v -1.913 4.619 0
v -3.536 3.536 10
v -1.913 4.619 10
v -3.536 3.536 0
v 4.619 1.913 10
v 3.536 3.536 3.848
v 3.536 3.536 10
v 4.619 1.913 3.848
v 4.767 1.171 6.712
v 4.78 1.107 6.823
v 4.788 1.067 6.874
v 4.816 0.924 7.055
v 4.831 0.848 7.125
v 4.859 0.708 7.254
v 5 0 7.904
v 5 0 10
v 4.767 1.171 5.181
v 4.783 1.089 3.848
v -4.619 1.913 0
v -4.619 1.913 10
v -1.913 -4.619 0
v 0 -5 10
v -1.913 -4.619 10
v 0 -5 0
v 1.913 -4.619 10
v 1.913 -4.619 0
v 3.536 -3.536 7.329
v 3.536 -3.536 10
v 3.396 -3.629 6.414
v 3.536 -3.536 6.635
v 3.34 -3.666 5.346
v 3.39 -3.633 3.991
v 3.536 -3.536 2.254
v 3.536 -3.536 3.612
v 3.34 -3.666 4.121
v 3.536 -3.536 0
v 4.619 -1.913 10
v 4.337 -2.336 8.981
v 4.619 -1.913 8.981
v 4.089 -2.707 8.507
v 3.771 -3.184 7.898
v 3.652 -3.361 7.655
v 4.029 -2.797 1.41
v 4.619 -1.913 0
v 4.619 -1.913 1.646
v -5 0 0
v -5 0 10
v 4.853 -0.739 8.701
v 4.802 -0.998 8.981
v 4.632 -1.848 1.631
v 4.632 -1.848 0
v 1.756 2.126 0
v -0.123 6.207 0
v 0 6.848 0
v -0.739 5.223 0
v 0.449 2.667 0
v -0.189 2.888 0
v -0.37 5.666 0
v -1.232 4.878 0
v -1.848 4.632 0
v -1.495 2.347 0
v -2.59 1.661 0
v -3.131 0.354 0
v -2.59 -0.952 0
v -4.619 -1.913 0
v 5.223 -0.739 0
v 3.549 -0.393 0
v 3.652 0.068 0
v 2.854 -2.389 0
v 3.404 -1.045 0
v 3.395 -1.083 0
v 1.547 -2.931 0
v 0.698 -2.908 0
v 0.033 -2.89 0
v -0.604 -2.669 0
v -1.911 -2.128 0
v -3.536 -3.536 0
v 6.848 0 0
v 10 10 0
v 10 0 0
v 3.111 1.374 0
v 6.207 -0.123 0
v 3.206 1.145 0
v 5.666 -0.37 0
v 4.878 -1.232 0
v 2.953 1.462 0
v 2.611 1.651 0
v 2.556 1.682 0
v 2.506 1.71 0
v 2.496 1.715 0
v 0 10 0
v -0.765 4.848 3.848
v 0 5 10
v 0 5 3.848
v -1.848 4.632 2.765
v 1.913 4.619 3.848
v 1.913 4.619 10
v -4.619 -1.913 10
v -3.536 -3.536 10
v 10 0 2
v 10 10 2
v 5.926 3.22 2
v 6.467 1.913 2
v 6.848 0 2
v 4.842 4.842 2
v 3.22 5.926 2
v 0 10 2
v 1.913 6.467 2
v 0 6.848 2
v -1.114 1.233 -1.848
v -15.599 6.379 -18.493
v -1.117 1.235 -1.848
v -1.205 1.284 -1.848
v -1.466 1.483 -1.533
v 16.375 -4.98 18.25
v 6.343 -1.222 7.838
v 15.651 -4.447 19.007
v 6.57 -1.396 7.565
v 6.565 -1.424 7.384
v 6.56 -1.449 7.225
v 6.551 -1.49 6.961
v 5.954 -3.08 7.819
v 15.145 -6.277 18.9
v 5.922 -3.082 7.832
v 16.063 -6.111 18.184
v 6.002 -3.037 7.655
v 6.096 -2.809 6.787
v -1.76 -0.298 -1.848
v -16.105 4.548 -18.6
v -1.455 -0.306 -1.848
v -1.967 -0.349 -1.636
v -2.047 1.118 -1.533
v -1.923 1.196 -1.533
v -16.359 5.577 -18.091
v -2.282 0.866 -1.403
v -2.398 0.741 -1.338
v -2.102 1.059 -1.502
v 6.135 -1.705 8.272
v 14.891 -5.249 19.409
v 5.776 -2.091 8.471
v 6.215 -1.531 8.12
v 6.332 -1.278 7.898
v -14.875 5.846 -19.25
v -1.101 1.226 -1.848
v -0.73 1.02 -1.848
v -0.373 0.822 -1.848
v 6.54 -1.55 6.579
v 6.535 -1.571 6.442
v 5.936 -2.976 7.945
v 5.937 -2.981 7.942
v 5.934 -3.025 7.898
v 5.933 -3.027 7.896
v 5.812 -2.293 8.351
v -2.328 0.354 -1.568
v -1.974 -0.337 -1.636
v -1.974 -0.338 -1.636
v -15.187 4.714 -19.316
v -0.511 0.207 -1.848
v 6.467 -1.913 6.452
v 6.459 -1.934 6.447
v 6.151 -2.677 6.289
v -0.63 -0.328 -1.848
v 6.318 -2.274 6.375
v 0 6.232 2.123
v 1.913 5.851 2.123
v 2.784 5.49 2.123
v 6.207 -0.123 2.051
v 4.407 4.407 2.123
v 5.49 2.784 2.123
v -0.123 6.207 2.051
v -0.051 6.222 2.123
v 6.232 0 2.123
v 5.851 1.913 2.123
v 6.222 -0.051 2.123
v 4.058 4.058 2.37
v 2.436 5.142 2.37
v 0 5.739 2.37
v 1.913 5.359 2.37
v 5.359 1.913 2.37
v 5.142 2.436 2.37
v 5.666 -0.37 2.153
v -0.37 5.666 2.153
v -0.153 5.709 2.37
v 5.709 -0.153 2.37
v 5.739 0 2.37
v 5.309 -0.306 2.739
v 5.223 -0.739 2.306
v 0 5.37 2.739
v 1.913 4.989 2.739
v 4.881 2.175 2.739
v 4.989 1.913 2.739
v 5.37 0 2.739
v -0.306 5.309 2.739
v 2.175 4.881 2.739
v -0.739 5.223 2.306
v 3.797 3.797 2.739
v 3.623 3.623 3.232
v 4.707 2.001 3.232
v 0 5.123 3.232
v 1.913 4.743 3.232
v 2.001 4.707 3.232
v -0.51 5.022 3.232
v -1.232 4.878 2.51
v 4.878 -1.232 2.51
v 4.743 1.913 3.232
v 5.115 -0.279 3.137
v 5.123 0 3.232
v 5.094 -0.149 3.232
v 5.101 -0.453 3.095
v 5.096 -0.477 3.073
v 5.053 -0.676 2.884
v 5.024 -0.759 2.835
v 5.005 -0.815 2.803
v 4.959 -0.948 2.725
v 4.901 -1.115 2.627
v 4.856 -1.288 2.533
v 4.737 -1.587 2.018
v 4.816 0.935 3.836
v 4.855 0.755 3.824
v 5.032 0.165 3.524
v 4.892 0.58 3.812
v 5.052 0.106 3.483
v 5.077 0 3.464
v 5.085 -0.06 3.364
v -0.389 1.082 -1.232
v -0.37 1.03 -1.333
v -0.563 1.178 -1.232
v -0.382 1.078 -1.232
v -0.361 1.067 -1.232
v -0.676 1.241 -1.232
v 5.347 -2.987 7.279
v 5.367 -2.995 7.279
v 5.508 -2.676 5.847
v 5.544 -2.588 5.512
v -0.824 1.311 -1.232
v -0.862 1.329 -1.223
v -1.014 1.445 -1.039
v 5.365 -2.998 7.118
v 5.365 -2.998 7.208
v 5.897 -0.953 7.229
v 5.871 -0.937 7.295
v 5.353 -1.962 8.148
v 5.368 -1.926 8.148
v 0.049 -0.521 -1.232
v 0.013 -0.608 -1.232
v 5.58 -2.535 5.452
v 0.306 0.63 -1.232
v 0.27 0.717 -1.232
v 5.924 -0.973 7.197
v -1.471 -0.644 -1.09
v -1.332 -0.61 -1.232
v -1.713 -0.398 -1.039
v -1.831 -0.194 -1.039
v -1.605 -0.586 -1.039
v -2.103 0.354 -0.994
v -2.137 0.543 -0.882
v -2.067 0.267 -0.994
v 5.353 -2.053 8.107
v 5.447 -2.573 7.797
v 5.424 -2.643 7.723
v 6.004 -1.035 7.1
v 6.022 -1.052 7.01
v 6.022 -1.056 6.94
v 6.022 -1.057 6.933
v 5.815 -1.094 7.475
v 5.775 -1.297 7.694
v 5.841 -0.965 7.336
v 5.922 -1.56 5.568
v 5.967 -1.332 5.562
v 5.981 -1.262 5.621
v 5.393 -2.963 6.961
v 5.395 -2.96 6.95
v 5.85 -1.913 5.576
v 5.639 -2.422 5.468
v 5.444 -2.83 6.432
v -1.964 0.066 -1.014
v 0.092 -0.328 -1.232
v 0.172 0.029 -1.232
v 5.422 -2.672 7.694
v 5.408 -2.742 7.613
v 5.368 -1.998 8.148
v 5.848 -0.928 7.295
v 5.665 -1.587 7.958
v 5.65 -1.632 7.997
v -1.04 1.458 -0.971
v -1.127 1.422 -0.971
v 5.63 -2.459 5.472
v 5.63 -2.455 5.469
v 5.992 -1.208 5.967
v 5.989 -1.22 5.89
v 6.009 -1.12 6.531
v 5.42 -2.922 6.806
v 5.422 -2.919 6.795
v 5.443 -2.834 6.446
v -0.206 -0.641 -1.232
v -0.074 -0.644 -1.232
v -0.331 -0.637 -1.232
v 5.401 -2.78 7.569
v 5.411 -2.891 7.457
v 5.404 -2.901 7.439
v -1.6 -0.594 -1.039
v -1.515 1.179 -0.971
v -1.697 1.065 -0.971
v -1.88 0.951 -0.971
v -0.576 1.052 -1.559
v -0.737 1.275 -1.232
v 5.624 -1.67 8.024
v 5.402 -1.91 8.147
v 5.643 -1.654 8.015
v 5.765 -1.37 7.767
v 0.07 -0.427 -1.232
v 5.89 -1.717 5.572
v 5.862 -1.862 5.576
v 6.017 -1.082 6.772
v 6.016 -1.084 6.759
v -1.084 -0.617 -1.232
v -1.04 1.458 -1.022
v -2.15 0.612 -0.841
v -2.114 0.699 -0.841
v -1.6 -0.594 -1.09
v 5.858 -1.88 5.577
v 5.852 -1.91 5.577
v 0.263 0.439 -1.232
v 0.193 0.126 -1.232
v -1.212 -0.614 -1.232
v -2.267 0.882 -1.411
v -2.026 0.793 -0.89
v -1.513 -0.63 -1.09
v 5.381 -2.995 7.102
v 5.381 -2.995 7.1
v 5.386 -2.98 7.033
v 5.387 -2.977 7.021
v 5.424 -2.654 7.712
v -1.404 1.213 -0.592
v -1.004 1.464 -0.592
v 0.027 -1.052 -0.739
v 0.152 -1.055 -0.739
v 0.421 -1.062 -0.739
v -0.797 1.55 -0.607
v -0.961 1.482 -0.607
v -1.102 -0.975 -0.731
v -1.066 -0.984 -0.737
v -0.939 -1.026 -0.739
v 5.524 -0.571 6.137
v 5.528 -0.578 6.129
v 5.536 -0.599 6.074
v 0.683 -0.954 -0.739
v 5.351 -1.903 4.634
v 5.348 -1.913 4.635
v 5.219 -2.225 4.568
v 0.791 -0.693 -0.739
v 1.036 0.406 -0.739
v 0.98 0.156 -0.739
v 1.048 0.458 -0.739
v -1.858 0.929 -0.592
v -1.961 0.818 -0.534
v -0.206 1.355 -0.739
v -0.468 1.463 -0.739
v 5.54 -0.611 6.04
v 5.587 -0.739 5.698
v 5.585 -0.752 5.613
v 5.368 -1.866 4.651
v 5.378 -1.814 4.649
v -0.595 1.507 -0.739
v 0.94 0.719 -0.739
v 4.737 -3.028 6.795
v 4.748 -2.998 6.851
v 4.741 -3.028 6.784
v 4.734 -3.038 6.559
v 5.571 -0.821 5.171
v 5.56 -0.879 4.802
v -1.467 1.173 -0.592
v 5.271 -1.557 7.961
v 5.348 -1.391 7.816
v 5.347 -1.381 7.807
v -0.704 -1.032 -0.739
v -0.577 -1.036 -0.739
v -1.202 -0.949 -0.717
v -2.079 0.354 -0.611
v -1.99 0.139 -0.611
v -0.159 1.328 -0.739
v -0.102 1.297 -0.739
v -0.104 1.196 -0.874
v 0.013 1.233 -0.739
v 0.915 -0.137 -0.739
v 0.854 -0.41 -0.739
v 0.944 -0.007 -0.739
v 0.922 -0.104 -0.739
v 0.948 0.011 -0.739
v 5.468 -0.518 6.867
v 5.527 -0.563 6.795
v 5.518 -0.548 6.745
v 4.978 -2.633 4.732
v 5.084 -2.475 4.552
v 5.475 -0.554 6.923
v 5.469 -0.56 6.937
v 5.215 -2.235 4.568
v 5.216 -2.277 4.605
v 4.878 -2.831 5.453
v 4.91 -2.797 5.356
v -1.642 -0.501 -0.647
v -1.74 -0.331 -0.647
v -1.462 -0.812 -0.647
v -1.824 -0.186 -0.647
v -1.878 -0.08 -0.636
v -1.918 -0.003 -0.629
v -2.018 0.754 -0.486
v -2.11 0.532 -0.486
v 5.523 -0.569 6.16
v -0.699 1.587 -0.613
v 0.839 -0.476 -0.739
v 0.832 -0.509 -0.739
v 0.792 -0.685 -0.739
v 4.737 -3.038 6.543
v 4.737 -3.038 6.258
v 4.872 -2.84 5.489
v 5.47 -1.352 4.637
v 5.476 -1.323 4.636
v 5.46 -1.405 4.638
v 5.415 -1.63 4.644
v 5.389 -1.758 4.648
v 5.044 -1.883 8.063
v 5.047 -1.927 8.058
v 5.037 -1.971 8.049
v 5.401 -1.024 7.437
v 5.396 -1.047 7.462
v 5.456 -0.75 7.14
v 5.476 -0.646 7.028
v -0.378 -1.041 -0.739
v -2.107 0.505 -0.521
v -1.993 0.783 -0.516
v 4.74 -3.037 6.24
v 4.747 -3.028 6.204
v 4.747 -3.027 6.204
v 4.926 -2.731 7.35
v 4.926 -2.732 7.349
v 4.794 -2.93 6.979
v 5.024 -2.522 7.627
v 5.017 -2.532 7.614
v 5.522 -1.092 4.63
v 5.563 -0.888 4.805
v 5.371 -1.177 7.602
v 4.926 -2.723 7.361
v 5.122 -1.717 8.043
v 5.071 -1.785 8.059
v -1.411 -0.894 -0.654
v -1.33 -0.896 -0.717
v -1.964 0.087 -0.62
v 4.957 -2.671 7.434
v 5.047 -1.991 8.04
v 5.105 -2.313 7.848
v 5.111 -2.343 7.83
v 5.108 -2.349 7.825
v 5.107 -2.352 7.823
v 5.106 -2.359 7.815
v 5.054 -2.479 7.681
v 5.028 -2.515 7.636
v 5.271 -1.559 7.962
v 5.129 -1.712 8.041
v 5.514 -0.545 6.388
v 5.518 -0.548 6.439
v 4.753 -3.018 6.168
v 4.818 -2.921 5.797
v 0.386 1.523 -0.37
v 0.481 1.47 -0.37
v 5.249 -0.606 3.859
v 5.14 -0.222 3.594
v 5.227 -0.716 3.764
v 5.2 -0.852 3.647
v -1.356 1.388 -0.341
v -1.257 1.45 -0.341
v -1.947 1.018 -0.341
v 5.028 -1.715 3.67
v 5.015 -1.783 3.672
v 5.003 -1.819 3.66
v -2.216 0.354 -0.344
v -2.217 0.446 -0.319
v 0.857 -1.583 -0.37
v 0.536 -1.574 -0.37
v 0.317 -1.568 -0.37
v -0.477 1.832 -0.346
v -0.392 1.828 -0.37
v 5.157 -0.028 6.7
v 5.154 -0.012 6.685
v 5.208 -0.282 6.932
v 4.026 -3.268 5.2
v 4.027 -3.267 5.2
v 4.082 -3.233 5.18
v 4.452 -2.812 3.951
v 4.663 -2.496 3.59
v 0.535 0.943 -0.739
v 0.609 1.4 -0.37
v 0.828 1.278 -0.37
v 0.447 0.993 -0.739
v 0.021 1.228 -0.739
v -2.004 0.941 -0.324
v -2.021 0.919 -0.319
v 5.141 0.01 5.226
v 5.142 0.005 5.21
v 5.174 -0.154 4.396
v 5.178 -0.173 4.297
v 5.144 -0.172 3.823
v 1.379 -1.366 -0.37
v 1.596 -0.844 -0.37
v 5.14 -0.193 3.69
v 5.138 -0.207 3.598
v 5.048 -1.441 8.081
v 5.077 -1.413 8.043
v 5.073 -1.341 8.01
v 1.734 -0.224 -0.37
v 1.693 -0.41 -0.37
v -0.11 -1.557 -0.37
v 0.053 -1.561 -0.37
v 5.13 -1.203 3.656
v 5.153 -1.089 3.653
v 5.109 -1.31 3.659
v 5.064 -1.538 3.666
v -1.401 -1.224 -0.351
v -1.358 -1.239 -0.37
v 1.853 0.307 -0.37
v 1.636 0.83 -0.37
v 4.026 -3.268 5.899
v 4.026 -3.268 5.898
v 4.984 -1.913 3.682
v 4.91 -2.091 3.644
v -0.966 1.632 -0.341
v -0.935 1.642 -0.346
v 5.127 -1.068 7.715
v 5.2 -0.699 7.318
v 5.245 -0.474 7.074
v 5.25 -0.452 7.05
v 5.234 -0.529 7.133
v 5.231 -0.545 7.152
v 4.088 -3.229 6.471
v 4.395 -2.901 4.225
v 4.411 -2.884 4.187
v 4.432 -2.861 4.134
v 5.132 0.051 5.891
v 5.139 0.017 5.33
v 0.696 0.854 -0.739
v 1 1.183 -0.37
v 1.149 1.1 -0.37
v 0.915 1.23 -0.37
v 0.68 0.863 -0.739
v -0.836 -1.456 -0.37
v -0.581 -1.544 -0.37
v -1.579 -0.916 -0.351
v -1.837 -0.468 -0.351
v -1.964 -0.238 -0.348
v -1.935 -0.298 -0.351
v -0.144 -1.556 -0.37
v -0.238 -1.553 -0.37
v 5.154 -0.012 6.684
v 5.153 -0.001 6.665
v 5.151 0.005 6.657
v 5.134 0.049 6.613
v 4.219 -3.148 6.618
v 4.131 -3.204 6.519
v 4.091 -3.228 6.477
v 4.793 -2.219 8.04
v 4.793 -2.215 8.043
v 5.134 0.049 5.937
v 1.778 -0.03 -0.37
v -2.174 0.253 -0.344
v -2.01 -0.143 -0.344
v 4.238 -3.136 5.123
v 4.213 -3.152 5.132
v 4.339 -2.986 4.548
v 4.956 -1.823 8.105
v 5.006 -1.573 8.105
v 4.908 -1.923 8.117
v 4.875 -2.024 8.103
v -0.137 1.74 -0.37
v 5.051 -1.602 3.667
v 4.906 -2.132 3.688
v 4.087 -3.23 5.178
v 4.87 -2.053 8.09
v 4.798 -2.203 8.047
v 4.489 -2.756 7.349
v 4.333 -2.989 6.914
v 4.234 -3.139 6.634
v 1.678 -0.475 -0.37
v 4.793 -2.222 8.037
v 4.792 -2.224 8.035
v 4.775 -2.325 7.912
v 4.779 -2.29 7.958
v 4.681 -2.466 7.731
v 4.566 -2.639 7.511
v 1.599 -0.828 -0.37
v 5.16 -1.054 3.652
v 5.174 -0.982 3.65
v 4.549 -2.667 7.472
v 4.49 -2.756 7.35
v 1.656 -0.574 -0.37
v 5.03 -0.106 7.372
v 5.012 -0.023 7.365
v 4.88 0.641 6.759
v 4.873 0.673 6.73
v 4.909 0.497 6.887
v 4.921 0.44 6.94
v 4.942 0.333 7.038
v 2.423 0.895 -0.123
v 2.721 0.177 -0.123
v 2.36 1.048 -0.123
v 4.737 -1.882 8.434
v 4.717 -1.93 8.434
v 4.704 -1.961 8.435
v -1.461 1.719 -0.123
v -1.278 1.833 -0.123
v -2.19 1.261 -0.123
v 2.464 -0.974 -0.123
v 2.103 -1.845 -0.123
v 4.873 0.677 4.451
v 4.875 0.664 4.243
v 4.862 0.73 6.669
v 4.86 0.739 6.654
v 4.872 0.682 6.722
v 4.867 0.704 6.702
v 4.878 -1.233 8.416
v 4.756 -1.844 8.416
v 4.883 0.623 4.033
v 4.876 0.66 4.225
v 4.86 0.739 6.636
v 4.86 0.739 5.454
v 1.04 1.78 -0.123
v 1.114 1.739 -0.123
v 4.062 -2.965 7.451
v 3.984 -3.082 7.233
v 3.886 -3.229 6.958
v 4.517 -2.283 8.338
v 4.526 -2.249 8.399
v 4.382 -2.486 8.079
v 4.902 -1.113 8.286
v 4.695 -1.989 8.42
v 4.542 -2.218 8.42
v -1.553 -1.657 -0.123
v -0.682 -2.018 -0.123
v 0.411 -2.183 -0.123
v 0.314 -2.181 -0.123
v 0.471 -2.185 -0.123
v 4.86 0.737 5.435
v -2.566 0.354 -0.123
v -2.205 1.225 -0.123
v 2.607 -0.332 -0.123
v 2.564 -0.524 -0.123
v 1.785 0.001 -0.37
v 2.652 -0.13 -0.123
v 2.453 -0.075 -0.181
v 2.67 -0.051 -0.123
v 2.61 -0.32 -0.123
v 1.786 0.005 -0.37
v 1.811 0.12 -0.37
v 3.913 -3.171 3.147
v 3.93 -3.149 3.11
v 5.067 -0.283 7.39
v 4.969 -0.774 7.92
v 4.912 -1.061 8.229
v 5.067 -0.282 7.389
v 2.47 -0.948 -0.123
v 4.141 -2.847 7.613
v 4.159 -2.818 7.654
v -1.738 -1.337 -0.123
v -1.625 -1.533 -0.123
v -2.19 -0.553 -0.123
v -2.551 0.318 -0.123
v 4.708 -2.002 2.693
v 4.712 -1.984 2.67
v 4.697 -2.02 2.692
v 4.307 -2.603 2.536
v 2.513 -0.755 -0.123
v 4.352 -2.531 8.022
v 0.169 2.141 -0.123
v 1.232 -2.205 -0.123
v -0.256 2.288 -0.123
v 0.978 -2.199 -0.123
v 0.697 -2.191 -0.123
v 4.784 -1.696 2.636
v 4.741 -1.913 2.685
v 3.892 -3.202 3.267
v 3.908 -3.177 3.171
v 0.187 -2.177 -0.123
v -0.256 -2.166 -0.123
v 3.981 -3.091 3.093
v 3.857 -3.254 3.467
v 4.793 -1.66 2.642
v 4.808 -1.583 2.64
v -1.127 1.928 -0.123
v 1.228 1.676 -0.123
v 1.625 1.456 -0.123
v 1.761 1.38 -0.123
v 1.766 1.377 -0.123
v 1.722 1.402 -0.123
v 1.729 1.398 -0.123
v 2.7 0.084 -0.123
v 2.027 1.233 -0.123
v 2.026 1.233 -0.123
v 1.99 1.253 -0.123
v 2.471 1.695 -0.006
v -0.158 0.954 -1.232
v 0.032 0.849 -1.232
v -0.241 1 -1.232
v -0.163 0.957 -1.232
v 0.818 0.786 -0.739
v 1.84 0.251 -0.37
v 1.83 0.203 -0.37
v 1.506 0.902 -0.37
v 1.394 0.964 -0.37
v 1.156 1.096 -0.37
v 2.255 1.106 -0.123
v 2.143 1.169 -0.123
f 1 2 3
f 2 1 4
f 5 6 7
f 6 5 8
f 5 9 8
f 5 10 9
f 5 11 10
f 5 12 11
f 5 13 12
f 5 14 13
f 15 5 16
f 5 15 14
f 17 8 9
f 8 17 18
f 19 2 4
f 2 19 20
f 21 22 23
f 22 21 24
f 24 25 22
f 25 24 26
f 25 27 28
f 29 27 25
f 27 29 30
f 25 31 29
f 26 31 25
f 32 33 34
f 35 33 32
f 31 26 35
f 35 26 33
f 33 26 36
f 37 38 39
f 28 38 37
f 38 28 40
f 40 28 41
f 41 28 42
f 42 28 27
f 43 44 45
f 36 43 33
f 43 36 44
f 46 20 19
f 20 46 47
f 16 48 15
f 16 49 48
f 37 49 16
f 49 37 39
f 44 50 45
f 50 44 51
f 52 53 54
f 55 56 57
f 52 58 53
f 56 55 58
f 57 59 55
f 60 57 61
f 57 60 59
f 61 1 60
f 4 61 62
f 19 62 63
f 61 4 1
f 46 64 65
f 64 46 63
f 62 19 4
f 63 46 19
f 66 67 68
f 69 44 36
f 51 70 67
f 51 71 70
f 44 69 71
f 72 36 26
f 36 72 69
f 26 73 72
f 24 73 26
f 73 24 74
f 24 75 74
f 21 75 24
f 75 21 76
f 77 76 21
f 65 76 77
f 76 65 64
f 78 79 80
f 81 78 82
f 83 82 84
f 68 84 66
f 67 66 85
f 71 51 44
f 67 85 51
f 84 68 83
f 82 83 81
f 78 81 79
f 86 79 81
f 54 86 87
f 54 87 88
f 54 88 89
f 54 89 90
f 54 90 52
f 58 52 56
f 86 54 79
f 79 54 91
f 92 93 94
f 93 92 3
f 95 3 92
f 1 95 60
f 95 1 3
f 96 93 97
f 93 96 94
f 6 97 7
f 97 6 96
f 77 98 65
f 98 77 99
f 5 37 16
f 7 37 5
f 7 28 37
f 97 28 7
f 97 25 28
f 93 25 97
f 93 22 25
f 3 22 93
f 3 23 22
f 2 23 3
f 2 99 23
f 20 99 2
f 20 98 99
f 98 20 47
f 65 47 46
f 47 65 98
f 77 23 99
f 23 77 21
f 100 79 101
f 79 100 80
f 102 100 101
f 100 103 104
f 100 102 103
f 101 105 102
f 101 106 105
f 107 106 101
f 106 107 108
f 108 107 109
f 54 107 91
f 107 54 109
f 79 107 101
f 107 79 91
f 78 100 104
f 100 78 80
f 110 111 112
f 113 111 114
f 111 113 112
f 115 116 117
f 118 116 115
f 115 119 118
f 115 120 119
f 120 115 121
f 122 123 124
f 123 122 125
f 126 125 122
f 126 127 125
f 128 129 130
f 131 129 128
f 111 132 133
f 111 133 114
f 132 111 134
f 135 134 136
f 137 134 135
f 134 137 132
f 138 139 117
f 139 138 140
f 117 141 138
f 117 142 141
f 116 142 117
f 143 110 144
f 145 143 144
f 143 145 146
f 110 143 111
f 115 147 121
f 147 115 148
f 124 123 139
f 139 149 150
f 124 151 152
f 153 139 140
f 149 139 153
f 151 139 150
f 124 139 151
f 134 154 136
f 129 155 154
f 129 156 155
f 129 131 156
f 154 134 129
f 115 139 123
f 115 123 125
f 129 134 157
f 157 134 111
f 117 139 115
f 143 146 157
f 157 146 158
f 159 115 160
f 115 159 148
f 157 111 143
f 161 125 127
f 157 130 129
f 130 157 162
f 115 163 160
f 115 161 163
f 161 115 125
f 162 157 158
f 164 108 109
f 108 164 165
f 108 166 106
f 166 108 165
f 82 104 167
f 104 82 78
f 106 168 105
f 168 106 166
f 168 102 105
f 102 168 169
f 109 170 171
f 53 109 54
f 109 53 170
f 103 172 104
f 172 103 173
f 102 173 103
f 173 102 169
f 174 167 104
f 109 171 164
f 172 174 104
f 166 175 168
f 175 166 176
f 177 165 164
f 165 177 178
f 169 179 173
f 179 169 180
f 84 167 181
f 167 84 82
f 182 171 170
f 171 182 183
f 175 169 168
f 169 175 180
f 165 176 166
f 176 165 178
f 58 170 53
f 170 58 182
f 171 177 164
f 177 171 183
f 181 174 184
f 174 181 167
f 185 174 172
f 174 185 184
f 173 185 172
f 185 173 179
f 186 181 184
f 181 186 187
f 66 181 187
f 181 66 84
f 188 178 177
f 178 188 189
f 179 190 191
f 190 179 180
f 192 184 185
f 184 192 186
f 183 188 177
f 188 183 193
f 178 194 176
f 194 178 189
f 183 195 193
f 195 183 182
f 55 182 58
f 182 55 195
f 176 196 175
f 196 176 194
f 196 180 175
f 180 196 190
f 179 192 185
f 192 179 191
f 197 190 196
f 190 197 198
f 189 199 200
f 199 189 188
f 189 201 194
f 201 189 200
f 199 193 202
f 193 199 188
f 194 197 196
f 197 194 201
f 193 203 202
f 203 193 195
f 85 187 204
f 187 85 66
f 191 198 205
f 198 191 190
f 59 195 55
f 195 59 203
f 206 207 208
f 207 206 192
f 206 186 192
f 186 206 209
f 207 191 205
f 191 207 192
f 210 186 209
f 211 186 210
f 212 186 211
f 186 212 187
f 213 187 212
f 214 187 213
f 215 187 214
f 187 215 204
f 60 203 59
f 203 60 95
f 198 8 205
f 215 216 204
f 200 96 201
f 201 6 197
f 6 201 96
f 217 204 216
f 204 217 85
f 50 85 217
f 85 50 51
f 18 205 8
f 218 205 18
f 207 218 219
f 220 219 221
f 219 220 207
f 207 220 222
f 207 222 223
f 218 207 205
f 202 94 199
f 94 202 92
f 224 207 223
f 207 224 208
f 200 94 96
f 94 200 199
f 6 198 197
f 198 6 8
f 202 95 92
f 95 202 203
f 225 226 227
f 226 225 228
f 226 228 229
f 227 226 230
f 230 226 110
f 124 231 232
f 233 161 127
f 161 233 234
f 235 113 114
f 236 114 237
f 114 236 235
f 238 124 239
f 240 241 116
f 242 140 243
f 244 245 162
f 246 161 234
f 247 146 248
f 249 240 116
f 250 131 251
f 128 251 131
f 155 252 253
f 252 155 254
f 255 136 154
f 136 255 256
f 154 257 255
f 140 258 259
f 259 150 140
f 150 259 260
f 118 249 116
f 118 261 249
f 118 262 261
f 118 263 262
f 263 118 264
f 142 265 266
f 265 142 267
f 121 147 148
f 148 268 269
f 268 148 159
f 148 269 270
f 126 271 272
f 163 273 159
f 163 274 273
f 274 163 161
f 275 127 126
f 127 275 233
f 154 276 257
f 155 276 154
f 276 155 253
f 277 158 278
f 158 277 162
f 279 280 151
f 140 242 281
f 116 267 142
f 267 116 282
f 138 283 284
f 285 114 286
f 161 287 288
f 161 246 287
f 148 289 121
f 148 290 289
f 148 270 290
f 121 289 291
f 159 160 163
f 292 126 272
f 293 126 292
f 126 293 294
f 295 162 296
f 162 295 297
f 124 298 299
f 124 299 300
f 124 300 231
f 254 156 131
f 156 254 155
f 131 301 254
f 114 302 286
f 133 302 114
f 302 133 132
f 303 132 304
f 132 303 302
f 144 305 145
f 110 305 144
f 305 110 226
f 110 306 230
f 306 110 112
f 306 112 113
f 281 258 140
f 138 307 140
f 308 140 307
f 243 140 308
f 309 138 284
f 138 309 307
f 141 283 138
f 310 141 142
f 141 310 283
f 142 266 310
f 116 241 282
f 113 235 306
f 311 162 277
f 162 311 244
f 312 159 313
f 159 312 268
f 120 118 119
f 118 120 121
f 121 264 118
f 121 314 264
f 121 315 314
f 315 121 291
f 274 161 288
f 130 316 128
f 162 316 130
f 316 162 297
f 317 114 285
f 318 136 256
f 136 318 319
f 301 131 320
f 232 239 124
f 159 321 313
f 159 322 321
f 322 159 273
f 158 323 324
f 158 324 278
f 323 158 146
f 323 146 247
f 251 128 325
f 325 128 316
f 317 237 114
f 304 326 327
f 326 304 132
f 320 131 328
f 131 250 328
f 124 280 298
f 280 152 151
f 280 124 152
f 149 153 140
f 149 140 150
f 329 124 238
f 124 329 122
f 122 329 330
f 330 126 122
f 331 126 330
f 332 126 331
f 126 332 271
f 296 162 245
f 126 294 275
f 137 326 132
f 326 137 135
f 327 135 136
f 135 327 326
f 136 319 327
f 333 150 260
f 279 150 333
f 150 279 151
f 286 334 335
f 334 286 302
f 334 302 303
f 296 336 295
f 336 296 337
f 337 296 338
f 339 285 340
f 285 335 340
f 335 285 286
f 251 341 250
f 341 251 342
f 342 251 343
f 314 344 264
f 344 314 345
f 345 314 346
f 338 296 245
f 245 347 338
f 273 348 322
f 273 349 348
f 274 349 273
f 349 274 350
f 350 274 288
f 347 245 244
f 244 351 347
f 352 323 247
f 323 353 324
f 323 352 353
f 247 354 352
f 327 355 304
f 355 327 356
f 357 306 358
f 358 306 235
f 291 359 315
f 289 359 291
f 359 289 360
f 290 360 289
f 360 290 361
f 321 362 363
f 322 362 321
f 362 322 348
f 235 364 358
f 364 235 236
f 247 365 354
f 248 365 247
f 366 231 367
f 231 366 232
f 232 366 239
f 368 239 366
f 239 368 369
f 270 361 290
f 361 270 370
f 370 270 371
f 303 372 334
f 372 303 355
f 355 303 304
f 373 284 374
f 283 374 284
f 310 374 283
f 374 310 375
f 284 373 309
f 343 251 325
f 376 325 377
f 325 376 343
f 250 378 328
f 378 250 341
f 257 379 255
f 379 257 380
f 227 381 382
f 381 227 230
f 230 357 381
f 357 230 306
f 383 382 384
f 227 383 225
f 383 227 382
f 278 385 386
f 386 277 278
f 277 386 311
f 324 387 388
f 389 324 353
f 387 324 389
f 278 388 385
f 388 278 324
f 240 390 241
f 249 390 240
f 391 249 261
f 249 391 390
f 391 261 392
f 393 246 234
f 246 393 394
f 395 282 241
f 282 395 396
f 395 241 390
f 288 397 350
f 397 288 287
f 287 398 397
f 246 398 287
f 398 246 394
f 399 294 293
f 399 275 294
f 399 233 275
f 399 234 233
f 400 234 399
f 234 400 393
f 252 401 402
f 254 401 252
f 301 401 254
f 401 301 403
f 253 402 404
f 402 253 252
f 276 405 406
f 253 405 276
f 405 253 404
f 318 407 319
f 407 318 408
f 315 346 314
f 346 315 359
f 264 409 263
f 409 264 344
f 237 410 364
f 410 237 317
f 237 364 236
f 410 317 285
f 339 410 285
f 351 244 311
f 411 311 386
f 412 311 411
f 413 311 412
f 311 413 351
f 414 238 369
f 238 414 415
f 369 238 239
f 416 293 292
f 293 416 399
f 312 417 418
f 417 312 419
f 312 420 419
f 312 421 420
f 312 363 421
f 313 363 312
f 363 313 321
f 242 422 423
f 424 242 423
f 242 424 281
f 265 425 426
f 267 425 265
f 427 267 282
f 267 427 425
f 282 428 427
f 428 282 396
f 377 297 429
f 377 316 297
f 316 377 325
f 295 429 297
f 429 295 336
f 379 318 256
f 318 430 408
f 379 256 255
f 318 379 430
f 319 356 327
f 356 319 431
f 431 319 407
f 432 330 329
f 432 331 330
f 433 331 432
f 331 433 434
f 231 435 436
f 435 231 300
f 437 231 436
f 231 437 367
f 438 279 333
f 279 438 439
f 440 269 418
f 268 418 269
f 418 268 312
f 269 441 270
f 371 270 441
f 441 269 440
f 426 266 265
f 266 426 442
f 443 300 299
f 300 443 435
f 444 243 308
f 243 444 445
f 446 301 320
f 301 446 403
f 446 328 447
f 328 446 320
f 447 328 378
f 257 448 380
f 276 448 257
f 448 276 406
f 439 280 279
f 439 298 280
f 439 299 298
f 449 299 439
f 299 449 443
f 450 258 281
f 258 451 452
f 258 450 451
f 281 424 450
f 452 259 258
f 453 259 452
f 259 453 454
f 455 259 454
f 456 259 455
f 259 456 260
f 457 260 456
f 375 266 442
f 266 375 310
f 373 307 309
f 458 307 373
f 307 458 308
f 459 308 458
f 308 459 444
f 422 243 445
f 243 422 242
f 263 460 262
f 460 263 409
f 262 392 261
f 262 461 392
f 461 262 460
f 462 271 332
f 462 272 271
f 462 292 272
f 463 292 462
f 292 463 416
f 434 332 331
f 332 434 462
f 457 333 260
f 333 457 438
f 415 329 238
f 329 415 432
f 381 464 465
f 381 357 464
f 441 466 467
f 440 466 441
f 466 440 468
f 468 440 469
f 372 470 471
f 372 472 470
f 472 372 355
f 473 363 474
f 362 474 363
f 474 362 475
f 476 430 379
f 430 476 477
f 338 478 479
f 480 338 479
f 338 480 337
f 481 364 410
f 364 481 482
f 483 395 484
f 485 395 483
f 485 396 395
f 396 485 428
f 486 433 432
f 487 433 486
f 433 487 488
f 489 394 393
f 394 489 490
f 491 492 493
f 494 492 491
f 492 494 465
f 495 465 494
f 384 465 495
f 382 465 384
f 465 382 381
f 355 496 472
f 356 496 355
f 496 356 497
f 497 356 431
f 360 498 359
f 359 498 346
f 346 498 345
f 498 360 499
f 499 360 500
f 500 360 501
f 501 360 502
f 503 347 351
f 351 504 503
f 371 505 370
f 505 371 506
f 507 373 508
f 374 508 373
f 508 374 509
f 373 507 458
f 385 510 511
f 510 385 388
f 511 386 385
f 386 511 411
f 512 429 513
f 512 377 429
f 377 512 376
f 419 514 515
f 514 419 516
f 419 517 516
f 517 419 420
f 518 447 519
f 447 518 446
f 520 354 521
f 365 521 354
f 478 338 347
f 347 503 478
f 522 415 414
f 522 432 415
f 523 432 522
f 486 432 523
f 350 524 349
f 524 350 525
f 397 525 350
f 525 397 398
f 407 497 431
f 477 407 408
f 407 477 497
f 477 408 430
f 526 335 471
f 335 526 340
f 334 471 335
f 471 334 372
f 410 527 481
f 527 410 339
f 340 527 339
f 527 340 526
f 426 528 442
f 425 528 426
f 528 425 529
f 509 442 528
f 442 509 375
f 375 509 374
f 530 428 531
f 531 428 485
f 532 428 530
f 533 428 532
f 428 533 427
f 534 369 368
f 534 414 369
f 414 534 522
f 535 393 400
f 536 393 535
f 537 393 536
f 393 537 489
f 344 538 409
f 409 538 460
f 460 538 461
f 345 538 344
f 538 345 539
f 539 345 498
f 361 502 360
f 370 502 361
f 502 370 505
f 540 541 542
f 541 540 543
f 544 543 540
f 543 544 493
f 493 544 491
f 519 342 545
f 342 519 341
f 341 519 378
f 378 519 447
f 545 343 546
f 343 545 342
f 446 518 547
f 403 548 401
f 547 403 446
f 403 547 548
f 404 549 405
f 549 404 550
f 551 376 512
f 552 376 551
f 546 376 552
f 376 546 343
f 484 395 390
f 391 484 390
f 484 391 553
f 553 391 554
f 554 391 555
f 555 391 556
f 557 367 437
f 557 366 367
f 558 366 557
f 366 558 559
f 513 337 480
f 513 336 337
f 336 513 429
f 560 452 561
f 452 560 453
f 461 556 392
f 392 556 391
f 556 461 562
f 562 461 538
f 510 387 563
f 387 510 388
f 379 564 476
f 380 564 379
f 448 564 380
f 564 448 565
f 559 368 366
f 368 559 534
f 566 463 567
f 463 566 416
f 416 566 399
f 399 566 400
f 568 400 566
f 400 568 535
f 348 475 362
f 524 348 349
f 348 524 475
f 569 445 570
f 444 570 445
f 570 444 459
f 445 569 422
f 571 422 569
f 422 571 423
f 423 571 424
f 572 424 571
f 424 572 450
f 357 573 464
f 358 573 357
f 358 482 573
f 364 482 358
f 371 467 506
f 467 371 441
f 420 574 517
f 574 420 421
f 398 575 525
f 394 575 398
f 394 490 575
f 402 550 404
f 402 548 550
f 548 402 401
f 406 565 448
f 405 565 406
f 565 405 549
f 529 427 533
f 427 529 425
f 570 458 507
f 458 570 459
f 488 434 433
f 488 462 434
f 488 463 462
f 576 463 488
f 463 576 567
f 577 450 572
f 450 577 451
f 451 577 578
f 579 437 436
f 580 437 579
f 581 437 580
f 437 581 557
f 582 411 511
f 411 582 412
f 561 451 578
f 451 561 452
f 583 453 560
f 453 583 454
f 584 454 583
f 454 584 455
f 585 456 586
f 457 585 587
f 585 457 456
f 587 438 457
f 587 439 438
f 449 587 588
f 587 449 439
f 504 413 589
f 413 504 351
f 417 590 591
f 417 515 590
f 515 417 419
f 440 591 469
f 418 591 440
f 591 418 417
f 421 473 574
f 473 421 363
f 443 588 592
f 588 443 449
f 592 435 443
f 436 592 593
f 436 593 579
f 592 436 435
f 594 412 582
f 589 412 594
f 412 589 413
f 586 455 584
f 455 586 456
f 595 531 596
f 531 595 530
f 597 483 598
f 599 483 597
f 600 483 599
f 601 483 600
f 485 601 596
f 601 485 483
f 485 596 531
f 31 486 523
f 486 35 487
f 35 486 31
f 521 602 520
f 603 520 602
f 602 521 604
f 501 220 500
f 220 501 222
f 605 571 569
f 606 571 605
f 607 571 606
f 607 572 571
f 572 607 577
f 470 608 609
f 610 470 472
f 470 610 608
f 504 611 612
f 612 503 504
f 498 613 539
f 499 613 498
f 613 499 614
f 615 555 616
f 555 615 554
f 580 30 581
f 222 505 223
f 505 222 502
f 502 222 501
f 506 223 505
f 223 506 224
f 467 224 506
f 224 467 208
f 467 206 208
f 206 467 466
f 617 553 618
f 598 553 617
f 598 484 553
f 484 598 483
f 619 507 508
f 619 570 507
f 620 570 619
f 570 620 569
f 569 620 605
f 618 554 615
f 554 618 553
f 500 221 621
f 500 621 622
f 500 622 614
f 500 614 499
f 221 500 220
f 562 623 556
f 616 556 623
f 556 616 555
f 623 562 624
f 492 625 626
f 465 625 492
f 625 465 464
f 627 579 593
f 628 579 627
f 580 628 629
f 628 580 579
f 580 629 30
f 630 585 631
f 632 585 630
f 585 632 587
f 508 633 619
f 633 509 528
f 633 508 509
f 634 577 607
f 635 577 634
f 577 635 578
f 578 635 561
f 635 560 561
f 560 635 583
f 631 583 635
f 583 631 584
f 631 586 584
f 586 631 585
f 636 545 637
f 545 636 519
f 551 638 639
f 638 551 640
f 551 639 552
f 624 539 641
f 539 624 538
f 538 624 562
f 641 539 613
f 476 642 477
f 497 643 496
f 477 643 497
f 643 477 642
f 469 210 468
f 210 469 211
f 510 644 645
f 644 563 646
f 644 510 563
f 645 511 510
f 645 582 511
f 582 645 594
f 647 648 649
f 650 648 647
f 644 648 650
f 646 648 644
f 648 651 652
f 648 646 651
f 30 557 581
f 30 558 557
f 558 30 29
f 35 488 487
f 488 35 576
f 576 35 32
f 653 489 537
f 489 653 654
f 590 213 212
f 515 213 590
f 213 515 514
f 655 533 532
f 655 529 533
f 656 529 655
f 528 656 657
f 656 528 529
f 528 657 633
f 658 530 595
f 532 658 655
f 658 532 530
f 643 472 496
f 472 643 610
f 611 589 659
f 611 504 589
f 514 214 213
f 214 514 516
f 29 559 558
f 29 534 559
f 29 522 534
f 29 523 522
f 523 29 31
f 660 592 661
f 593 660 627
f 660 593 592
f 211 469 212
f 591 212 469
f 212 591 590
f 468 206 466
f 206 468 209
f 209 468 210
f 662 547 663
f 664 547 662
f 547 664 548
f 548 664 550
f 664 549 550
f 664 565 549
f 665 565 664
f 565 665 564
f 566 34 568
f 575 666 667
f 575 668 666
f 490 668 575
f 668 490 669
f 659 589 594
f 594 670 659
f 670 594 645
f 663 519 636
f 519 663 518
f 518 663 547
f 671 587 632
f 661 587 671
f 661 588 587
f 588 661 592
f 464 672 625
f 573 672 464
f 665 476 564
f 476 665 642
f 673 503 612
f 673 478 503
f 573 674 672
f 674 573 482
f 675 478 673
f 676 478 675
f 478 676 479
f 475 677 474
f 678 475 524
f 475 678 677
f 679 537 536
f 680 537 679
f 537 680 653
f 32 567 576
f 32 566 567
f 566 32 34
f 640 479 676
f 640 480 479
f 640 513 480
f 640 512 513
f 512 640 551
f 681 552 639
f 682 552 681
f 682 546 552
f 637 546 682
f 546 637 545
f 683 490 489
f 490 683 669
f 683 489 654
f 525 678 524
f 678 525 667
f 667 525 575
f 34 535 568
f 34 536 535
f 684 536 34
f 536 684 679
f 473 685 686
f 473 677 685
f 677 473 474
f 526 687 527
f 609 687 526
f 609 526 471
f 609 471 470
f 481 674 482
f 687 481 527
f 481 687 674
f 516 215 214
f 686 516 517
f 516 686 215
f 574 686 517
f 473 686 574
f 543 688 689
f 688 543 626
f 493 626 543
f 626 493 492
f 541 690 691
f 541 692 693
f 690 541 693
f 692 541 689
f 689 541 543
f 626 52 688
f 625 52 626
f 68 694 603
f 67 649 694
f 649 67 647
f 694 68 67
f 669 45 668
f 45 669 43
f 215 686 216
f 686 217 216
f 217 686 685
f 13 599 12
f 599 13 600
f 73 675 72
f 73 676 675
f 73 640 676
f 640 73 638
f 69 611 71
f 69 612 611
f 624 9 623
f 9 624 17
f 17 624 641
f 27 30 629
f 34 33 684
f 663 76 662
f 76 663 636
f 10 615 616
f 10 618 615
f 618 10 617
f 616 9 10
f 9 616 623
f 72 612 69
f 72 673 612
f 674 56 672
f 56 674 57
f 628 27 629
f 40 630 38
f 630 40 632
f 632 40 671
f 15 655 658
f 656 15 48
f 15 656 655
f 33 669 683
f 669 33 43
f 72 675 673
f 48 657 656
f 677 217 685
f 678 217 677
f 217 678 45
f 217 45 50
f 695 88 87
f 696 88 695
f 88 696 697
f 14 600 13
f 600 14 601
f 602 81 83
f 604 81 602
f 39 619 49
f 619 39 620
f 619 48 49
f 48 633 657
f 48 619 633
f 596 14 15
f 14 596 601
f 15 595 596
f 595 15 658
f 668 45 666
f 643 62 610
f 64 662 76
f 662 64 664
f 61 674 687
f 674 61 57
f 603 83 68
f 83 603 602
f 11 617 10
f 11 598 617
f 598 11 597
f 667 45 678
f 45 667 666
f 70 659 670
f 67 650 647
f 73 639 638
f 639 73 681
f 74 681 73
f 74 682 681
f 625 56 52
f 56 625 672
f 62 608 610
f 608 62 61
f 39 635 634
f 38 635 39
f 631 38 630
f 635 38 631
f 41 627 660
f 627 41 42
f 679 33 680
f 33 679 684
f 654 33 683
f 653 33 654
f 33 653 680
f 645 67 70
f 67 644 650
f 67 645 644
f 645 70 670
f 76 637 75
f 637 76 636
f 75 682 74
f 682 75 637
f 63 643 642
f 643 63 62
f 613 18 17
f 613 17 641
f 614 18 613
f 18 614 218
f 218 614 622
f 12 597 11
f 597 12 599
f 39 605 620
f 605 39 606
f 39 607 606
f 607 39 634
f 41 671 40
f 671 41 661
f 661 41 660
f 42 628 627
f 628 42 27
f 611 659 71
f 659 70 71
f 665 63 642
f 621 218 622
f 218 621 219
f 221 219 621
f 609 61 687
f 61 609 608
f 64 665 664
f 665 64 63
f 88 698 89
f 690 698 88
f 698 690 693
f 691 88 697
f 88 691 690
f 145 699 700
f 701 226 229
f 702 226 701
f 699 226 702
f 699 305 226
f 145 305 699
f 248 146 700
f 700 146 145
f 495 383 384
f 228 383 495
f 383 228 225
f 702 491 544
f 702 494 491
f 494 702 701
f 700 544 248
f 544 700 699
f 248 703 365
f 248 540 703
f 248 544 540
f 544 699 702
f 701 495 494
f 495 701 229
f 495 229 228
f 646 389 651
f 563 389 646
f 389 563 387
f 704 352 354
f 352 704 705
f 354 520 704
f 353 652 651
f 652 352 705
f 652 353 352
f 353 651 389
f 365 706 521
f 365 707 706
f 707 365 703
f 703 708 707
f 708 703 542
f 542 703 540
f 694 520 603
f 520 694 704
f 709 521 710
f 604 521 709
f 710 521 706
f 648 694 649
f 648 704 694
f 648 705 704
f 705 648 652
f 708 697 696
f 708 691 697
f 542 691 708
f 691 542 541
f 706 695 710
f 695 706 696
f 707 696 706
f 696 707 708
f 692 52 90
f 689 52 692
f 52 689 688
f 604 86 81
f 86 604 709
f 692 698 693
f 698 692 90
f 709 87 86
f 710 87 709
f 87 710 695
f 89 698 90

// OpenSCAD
// Fillet function

module fillet(r=1.0,steps=3,include=true) {
  if(include) for (k=[0:$children-1]) {
	children(k);
  }
  for (i=[0:$children-2] ) {
    for(j=[i+1:$children-1] ) {
	fillet_two(r=r,steps=steps) {
	  children(i);
	  children(j);
	  intersection() {
		children(i);
		children(j);
	  }
	}
    }
  }
}

module fillet_two(r=1.0,steps=3) {
  for(step=[1:steps]) {
	hull() {
	  render() intersection() {
		children(0);
		offset_3d(r=r*step/steps) children(2);
	  }
	  render() intersection() {
		children(1);
		offset_3d(r=r*(steps-step+1)/steps) children(2);
	  }
	}
  }
}

module offset_3d(r=1.0) {
  for(k=[0:$children-1]) minkowski() {
	children(k);
	sphere(r=r,$fn=8);
  }
}

fillet(r=2,steps=5) {
	cylinder(r=5,h=10);
	cube([10,10,2]);
	rotate([30,30,30]) cylinder(r=1.0,h=50,center=true);
}
